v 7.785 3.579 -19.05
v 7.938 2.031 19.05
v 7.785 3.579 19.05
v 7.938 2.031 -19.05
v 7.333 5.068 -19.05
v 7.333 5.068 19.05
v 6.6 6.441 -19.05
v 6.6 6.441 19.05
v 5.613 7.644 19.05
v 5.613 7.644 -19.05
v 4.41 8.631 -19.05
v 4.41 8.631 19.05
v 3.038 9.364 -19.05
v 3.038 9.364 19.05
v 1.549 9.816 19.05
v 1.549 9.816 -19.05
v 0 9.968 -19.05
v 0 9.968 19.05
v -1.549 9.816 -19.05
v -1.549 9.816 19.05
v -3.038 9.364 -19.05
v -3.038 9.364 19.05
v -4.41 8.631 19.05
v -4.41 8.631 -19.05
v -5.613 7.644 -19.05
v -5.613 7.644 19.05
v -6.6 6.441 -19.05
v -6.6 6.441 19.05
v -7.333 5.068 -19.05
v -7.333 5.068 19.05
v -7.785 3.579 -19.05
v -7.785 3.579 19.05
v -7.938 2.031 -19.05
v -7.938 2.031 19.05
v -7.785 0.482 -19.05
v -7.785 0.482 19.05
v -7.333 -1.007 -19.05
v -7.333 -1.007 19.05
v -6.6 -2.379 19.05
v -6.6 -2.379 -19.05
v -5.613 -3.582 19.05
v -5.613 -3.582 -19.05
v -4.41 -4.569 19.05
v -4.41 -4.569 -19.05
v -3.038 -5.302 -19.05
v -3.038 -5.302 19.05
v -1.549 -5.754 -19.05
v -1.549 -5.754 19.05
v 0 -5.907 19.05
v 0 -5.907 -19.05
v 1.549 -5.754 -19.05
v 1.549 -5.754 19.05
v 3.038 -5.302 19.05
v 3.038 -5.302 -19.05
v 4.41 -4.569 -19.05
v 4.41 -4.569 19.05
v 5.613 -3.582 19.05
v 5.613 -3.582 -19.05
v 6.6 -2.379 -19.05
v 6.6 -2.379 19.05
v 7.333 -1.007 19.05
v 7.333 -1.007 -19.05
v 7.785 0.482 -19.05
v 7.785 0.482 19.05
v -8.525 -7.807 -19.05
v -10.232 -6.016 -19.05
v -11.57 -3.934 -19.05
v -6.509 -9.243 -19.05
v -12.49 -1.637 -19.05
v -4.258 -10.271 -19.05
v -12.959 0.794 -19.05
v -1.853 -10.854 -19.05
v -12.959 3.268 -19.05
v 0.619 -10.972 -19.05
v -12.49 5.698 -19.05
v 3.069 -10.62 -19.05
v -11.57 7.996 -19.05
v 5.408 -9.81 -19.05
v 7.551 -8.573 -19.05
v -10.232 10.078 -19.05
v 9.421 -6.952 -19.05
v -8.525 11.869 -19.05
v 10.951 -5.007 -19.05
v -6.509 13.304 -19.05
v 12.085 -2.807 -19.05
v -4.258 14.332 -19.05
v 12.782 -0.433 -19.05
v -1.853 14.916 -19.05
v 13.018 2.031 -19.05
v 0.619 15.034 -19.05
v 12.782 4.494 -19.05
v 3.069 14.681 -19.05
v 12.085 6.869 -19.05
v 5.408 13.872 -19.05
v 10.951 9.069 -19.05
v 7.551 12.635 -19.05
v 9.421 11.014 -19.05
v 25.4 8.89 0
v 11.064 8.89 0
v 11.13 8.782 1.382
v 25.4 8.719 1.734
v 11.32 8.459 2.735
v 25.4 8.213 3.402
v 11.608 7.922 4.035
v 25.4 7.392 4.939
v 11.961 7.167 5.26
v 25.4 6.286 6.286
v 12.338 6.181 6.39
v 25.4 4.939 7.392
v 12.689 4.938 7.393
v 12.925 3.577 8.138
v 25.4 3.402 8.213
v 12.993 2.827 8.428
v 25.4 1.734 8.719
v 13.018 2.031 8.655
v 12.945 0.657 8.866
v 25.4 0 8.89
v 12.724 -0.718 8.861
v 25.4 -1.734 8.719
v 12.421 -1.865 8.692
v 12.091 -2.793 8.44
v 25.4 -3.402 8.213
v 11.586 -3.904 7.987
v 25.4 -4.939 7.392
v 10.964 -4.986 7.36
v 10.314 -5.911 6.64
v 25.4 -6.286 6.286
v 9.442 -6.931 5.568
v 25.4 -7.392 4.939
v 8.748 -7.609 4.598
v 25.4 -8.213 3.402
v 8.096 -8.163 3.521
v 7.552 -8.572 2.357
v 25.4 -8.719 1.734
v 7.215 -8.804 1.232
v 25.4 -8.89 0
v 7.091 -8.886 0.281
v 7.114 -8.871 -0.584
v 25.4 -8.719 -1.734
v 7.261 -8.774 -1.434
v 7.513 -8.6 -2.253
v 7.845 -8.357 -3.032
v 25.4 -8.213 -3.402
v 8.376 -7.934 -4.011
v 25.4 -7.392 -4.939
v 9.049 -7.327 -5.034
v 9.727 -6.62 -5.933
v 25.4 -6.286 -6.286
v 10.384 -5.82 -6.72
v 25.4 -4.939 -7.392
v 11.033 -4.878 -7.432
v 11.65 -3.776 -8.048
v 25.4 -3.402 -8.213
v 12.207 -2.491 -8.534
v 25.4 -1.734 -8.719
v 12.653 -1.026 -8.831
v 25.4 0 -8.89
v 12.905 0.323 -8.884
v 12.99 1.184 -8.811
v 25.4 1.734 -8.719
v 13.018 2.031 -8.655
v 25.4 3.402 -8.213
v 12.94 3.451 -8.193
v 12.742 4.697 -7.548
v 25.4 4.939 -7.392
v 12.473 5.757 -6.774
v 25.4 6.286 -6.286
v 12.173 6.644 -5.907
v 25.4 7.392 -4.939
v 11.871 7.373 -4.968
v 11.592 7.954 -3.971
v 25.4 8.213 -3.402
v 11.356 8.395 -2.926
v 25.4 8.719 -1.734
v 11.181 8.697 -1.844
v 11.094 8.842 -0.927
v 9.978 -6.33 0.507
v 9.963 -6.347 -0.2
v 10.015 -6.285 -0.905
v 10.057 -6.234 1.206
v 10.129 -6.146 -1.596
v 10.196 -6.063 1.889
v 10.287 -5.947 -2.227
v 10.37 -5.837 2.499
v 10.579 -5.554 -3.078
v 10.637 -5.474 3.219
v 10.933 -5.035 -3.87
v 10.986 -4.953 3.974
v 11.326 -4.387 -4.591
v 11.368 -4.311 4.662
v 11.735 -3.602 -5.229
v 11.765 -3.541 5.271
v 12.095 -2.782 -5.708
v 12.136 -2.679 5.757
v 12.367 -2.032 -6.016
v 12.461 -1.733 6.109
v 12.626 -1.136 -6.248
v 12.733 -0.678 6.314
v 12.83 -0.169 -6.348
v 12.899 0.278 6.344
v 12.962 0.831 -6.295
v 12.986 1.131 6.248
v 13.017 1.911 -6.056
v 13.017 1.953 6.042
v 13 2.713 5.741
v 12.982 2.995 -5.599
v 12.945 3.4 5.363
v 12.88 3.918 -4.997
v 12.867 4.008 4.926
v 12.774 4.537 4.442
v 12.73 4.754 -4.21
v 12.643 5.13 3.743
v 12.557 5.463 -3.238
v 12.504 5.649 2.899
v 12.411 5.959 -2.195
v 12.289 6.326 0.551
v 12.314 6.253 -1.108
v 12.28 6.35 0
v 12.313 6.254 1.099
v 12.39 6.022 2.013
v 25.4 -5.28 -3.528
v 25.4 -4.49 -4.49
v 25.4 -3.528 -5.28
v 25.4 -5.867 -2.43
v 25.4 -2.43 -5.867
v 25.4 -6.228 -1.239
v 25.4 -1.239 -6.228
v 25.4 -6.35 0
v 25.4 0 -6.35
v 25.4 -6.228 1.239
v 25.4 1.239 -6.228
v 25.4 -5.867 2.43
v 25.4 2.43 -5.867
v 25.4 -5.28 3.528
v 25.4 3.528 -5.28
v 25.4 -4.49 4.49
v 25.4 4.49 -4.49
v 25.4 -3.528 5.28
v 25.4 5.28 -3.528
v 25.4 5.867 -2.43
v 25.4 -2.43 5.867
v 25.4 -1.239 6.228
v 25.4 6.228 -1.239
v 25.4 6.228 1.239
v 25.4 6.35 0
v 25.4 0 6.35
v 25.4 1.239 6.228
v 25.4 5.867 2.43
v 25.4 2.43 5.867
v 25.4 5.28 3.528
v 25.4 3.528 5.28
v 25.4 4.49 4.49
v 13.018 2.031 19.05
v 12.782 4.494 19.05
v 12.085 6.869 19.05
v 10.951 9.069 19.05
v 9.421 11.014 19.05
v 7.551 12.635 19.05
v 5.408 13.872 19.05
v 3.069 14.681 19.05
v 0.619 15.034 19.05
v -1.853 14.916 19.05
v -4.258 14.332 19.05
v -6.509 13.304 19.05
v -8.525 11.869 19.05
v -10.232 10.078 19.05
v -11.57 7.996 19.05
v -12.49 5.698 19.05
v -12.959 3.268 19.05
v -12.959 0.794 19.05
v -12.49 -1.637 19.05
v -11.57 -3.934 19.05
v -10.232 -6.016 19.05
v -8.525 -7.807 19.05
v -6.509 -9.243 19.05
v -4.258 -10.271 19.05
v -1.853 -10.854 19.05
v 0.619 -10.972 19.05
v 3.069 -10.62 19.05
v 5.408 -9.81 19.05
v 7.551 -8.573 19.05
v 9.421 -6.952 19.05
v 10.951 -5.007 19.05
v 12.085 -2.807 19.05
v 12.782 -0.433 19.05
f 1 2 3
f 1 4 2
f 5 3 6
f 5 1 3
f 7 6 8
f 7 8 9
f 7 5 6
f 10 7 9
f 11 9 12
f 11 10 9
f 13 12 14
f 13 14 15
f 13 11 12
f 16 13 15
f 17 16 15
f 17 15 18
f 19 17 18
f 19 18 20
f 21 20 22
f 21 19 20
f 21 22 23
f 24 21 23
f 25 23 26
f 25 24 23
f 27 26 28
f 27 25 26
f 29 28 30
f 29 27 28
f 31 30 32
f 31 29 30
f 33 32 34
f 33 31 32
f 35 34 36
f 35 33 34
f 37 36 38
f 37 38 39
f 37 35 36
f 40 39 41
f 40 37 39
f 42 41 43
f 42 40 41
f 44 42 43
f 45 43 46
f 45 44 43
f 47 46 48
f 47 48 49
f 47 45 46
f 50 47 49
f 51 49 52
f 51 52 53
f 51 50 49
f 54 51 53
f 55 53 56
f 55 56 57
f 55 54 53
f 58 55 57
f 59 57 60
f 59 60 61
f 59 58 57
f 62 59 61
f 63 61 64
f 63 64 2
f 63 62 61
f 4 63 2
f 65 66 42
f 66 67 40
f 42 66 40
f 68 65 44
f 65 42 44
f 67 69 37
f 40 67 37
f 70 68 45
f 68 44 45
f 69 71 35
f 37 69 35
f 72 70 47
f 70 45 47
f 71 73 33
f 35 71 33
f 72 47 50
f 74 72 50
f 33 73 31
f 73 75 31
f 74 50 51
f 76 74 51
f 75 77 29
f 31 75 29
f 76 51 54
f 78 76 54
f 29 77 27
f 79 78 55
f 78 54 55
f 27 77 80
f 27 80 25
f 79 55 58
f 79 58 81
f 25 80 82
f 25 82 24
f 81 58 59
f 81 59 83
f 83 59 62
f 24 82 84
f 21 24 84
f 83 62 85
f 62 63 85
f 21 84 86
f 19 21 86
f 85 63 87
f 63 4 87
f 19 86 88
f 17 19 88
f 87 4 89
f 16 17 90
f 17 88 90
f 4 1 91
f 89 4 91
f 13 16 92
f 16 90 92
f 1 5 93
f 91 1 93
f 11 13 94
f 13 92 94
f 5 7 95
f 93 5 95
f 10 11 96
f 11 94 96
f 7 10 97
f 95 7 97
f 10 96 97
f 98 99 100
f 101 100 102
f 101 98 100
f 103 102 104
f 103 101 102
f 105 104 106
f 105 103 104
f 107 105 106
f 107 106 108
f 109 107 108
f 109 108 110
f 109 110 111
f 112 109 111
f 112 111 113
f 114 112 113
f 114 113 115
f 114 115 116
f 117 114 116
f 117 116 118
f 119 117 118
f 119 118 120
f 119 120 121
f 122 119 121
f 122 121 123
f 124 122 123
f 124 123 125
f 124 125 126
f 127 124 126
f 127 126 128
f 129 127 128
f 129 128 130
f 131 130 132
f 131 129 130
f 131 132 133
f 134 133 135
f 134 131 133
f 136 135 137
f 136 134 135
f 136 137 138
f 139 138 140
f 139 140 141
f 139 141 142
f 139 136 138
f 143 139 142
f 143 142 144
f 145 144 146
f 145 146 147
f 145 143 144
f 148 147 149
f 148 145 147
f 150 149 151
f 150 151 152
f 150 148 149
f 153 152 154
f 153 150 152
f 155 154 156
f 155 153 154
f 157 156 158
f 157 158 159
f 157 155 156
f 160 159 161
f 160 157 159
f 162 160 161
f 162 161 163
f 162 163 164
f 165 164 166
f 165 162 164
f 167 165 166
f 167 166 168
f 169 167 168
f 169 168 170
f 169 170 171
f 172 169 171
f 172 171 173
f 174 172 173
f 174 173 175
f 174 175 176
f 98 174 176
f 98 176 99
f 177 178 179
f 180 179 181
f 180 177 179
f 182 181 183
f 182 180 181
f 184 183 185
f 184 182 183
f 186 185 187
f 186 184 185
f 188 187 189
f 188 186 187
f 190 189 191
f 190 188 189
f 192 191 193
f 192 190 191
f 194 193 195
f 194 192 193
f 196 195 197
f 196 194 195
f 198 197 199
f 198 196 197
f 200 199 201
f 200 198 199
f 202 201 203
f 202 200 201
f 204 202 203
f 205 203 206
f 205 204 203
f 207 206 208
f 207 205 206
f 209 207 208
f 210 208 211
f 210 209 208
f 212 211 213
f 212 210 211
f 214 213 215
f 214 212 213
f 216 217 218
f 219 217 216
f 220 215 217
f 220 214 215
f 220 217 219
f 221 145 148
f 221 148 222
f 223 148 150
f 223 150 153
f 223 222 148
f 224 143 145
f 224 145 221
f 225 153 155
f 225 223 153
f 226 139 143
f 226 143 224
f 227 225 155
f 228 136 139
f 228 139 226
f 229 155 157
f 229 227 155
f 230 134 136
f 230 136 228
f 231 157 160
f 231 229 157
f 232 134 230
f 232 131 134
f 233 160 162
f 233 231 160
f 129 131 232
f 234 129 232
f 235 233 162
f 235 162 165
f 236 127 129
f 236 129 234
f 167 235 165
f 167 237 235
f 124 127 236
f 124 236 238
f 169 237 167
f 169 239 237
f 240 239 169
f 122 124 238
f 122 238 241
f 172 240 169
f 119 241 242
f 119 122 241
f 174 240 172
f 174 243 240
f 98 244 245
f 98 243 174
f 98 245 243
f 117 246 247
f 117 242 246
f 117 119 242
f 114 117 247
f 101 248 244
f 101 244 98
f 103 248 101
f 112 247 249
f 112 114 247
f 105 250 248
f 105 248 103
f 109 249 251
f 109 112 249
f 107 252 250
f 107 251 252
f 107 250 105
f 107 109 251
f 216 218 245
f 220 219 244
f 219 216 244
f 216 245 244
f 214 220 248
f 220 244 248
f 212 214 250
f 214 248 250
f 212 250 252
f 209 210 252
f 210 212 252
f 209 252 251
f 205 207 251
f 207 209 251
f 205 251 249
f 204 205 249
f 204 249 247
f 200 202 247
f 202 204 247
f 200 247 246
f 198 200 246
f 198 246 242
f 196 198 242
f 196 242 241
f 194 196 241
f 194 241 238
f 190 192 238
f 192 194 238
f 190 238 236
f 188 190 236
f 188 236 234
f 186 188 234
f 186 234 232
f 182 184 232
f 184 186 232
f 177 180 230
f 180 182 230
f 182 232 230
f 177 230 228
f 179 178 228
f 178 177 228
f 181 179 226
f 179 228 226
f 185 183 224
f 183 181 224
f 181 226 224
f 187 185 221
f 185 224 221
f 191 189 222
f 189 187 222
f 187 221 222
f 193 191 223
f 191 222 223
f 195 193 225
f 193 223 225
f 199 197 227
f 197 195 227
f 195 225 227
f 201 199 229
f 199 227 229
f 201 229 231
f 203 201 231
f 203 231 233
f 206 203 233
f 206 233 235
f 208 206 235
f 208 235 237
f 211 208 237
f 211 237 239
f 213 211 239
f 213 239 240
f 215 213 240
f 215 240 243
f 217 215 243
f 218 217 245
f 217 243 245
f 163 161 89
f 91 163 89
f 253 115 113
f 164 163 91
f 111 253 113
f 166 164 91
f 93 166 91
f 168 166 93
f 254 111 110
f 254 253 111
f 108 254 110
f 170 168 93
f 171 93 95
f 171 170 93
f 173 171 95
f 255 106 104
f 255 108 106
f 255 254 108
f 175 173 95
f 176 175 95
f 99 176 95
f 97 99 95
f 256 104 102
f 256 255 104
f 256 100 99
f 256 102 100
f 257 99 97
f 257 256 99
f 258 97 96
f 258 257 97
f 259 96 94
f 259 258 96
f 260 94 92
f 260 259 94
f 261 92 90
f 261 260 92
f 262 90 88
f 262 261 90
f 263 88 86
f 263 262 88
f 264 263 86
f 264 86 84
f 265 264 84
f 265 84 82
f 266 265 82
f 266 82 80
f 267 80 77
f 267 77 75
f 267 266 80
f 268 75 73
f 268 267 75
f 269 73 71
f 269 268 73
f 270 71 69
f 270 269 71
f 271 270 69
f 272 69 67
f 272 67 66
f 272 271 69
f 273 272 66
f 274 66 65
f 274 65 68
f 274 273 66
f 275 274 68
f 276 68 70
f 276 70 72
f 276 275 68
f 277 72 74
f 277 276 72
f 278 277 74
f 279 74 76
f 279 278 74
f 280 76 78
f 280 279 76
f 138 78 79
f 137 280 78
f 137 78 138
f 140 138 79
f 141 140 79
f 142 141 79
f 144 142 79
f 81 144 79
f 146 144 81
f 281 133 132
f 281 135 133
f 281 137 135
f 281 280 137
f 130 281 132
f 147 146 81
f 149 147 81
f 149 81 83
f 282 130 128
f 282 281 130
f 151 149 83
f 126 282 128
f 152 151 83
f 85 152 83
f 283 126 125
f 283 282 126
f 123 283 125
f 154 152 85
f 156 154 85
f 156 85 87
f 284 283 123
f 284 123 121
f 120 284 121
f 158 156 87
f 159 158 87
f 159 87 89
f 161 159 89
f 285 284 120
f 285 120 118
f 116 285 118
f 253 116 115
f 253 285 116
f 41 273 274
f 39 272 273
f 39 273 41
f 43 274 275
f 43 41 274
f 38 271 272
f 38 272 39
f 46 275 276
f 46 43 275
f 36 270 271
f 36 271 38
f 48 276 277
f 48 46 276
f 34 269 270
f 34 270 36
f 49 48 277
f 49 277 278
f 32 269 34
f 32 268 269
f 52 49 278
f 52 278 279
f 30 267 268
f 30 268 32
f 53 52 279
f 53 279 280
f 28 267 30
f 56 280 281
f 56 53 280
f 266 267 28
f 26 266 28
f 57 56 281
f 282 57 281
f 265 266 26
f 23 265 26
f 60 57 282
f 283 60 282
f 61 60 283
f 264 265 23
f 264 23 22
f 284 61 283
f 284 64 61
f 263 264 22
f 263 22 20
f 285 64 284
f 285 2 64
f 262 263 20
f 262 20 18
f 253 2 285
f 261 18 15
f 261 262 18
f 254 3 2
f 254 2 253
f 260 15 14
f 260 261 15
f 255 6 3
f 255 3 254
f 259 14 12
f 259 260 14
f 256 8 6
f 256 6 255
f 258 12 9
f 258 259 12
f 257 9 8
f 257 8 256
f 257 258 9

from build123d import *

# Parameters (mm, degrees)
F0_R          = 13.0175
F0_R_2        = 7.9375
F1_DEPTH      = 19.05
F1_DEPTH_BACK = 19.05
F4_END_RADIUS = 13.0175
F3_R          = 8.89
F3_R_2        = 6.35
F4_REACH      = 63.563217139


with BuildPart() as f1:
    # F0 (on Top) → F1 (new body, two sides)
    with BuildSketch(Plane.XY) as f1_sk:
        with Locations((0, 2.0309128979)):
            Circle(F0_R)
        with Locations((0, 2.0309128979)):
            Circle(F0_R_2, mode=Mode.SUBTRACT)
    extrude(amount=F1_DEPTH)
    extrude(f1_sk.sketch, amount=-F1_DEPTH_BACK)

    f4_end = (Plane(origin=(0, 2.0309128979, -9.525), x_dir=(1, 0, 0), z_dir=(0, 0, 1)) * Cylinder(F4_END_RADIUS, 233.0934565066, mode=Mode.PRIVATE)).faces().sort_by_distance((-13.0175, 2.0309128979, -9.525))[0]
    # F3 (on offset) → F4 (join, up to the whole of a round face its end follows)
    with BuildSketch(Plane.YZ.offset(25.4)):
        Circle(F3_R)
        Circle(F3_R_2, mode=Mode.SUBTRACT)
    f4_long = extrude(amount=-F4_REACH, mode=Mode.PRIVATE)
    add(split(f4_long, bisect_by=f4_end, keep=Keep.ALL, mode=Mode.PRIVATE).solids().sort_by_distance((25.4, -8.6385528286, 0))[0])


solid = f1.part
